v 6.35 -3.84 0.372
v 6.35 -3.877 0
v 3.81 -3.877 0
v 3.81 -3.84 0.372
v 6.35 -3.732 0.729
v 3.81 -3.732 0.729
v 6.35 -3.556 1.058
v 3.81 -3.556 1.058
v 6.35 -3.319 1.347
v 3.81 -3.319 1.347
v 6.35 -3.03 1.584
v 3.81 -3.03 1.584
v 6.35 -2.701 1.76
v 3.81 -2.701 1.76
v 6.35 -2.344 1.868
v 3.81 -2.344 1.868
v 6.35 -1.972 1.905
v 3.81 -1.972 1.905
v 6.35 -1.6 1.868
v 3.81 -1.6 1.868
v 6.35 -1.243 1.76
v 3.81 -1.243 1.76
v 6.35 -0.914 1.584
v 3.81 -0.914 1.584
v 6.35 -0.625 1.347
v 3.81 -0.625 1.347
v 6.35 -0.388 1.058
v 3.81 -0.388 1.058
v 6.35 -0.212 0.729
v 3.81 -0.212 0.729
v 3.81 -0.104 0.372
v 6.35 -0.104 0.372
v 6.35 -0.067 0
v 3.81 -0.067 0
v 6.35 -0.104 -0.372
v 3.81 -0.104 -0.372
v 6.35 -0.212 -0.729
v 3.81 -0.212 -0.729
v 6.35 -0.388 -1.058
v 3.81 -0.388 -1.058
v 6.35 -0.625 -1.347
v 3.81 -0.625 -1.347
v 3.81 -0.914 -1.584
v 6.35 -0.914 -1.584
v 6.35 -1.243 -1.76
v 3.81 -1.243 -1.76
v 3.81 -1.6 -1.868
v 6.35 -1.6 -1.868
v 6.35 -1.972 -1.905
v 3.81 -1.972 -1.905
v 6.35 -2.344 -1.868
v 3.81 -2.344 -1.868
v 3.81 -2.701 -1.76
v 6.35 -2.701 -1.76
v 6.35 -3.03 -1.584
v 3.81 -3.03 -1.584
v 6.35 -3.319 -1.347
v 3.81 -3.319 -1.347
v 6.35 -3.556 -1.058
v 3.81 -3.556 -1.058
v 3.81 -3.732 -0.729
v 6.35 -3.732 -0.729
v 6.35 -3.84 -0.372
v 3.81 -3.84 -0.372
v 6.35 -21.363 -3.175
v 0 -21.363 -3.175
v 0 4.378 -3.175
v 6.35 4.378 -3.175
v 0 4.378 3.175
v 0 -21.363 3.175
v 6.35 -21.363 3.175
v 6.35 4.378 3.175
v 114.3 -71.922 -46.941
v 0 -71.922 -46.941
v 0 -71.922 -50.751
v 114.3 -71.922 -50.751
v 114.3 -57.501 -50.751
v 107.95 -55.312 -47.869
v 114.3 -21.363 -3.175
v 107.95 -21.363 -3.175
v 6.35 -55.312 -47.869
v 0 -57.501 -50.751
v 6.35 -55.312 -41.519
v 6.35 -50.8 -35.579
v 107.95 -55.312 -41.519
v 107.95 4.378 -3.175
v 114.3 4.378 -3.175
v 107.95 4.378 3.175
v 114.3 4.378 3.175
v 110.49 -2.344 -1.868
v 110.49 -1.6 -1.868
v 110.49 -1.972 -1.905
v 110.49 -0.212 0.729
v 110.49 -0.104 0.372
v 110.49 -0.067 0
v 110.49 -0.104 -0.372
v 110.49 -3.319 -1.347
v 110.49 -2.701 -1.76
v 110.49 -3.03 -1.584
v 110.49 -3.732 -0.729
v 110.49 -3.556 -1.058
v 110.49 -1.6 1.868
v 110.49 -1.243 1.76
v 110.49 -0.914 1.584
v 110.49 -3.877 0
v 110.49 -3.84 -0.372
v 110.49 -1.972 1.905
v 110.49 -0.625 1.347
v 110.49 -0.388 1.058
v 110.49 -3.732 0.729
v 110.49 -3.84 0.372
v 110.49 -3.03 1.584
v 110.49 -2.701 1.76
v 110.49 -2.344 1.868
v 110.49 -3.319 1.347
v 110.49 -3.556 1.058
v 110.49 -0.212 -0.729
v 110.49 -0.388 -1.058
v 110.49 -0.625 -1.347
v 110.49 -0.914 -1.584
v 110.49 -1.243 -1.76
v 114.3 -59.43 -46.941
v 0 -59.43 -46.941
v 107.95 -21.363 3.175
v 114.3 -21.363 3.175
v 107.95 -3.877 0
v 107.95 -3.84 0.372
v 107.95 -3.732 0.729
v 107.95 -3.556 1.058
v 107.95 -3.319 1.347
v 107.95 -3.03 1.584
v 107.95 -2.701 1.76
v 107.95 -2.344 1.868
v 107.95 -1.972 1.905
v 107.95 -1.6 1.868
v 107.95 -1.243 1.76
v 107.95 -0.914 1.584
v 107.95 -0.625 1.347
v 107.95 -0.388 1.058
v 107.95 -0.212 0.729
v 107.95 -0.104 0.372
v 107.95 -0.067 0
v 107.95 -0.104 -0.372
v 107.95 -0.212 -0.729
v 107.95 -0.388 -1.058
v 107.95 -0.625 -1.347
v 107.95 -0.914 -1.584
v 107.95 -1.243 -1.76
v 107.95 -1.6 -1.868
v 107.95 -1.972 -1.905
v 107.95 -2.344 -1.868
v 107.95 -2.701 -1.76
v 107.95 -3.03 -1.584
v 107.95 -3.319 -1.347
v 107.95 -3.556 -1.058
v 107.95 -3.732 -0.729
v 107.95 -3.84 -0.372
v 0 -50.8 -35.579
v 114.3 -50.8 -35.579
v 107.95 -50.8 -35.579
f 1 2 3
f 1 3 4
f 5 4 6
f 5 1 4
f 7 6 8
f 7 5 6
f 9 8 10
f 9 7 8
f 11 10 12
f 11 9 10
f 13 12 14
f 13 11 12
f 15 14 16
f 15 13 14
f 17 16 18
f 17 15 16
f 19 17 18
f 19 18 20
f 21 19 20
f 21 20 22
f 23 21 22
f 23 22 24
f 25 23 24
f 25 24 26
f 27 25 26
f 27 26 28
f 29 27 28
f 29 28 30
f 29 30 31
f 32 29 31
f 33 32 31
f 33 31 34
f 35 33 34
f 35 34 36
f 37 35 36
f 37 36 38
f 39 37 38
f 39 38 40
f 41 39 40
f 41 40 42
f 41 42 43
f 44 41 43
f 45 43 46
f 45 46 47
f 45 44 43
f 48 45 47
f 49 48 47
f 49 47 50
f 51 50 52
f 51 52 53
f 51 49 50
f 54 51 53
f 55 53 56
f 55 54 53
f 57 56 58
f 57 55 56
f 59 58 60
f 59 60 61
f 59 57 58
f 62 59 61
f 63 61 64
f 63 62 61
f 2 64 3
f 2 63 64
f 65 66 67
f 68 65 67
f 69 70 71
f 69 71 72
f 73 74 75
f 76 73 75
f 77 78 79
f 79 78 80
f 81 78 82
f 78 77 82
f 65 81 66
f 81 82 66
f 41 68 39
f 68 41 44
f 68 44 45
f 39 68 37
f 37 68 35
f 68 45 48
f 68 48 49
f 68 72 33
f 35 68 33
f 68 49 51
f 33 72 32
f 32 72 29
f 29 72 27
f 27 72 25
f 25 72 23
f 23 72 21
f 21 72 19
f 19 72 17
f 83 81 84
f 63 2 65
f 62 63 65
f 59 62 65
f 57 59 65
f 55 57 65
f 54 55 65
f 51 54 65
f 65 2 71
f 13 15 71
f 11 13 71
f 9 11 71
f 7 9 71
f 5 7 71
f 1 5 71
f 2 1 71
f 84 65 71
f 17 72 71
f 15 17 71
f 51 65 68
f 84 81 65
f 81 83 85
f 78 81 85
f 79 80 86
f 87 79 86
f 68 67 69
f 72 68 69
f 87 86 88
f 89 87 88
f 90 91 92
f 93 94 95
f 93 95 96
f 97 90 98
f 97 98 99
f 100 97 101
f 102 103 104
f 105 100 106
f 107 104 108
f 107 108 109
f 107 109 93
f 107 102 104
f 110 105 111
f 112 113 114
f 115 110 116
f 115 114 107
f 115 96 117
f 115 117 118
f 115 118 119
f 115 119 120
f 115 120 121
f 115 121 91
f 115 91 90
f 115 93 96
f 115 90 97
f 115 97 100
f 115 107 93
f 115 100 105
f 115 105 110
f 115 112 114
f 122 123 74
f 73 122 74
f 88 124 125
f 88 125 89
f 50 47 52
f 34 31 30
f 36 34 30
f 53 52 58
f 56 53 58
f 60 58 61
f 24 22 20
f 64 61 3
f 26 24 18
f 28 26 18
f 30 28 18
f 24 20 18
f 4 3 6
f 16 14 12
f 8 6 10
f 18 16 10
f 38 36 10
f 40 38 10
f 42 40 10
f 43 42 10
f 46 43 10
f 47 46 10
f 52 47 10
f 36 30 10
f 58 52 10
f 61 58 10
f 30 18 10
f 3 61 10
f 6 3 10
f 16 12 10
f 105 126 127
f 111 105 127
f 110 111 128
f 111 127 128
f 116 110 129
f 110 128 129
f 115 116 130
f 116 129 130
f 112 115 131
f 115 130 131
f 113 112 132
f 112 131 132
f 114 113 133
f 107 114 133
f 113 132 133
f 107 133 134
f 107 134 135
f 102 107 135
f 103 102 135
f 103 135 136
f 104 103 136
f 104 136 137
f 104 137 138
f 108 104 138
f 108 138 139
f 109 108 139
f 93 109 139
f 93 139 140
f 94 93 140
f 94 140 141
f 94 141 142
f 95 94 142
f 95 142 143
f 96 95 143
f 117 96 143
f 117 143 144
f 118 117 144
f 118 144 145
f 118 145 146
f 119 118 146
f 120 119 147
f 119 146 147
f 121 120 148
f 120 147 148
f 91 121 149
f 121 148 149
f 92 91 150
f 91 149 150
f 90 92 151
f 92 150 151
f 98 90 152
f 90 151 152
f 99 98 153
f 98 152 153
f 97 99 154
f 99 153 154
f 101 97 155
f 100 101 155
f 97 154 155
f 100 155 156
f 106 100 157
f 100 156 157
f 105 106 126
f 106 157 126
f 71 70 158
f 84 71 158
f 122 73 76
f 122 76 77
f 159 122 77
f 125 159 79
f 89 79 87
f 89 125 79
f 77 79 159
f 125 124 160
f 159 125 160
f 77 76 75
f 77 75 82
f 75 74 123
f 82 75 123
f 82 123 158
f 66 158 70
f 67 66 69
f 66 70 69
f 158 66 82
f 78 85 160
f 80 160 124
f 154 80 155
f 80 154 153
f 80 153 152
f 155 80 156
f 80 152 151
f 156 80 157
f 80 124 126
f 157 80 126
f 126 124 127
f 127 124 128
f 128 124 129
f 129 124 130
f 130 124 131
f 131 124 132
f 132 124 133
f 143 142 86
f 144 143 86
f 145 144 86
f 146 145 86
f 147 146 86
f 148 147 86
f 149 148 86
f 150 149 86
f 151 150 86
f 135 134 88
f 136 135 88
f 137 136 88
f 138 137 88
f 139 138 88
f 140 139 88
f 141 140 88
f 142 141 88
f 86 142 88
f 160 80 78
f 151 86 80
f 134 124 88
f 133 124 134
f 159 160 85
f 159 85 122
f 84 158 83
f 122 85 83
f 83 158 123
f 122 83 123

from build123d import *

# Parameters (mm, degrees)
F0_W          = 25.7408986799
F0_H          = 6.35
F1_DEPTH      = 114.3
F2_W          = 101.6
F2_H          = 25.7408986799
F2_H_2        = 33.9491013201
F3_DEPTH      = 127
F5_R          = 1.905
F6_DEPTH      = 53.34
F6_DEPTH_BACK = 53.34


with BuildPart() as f1:
    # F0 (on Right) → F1 (new body)
    with BuildSketch(Plane.YZ):
        with Locations((-8.492361987, 0)):
            Rectangle(F0_W, F0_H)
        Polygon((-21.362811327, 3.175), (-50.8, -35.5794671973), (-50.8, -41.9294671973), (-21.362811327, -3.175), align=None)
        Polygon((-62.3238671319, -50.7507981185), (-59.429860403, -46.9407981185), (-71.9224512577, -46.9407981185), (-71.9224512577, -50.7507981185), align=None)
        Polygon((-50.8, -41.9294671973), (-50.8, -35.5794671973), (-59.429860403, -46.9407981185), (-57.5005225837, -46.9407981185), (-57.5005225837, -50.7507981185), align=None)
        Polygon((-57.5005225837, -46.9407981185), (-59.429860403, -46.9407981185), (-62.3238671319, -50.7507981185), (-57.5005225837, -50.7507981185), align=None)
    extrude(amount=F1_DEPTH)

    # F2 (on face) → F3 (cut)
    with BuildSketch(Plane.XY.offset(3.175)):
        with Locations((57.15, -8.492361987)):
            Rectangle(F2_W, F2_H)
        with Locations((57.15, -38.337361987)):
            Rectangle(F2_W, F2_H_2)
    extrude(amount=-F3_DEPTH, mode=Mode.SUBTRACT)

    # F5 (on offset) → F6 (cut, two sides)
    with BuildSketch(Plane(origin=(57.15, 0, 0), x_dir=(0, -1, 0), z_dir=(-1, 0, 0))) as f6_sk:
        with Locations((1.971912647, 0)):
            Circle(F5_R)
    extrude(amount=-F6_DEPTH, mode=Mode.SUBTRACT)
    extrude(f6_sk.sketch, amount=F6_DEPTH_BACK, mode=Mode.SUBTRACT)


solid = f1.part
